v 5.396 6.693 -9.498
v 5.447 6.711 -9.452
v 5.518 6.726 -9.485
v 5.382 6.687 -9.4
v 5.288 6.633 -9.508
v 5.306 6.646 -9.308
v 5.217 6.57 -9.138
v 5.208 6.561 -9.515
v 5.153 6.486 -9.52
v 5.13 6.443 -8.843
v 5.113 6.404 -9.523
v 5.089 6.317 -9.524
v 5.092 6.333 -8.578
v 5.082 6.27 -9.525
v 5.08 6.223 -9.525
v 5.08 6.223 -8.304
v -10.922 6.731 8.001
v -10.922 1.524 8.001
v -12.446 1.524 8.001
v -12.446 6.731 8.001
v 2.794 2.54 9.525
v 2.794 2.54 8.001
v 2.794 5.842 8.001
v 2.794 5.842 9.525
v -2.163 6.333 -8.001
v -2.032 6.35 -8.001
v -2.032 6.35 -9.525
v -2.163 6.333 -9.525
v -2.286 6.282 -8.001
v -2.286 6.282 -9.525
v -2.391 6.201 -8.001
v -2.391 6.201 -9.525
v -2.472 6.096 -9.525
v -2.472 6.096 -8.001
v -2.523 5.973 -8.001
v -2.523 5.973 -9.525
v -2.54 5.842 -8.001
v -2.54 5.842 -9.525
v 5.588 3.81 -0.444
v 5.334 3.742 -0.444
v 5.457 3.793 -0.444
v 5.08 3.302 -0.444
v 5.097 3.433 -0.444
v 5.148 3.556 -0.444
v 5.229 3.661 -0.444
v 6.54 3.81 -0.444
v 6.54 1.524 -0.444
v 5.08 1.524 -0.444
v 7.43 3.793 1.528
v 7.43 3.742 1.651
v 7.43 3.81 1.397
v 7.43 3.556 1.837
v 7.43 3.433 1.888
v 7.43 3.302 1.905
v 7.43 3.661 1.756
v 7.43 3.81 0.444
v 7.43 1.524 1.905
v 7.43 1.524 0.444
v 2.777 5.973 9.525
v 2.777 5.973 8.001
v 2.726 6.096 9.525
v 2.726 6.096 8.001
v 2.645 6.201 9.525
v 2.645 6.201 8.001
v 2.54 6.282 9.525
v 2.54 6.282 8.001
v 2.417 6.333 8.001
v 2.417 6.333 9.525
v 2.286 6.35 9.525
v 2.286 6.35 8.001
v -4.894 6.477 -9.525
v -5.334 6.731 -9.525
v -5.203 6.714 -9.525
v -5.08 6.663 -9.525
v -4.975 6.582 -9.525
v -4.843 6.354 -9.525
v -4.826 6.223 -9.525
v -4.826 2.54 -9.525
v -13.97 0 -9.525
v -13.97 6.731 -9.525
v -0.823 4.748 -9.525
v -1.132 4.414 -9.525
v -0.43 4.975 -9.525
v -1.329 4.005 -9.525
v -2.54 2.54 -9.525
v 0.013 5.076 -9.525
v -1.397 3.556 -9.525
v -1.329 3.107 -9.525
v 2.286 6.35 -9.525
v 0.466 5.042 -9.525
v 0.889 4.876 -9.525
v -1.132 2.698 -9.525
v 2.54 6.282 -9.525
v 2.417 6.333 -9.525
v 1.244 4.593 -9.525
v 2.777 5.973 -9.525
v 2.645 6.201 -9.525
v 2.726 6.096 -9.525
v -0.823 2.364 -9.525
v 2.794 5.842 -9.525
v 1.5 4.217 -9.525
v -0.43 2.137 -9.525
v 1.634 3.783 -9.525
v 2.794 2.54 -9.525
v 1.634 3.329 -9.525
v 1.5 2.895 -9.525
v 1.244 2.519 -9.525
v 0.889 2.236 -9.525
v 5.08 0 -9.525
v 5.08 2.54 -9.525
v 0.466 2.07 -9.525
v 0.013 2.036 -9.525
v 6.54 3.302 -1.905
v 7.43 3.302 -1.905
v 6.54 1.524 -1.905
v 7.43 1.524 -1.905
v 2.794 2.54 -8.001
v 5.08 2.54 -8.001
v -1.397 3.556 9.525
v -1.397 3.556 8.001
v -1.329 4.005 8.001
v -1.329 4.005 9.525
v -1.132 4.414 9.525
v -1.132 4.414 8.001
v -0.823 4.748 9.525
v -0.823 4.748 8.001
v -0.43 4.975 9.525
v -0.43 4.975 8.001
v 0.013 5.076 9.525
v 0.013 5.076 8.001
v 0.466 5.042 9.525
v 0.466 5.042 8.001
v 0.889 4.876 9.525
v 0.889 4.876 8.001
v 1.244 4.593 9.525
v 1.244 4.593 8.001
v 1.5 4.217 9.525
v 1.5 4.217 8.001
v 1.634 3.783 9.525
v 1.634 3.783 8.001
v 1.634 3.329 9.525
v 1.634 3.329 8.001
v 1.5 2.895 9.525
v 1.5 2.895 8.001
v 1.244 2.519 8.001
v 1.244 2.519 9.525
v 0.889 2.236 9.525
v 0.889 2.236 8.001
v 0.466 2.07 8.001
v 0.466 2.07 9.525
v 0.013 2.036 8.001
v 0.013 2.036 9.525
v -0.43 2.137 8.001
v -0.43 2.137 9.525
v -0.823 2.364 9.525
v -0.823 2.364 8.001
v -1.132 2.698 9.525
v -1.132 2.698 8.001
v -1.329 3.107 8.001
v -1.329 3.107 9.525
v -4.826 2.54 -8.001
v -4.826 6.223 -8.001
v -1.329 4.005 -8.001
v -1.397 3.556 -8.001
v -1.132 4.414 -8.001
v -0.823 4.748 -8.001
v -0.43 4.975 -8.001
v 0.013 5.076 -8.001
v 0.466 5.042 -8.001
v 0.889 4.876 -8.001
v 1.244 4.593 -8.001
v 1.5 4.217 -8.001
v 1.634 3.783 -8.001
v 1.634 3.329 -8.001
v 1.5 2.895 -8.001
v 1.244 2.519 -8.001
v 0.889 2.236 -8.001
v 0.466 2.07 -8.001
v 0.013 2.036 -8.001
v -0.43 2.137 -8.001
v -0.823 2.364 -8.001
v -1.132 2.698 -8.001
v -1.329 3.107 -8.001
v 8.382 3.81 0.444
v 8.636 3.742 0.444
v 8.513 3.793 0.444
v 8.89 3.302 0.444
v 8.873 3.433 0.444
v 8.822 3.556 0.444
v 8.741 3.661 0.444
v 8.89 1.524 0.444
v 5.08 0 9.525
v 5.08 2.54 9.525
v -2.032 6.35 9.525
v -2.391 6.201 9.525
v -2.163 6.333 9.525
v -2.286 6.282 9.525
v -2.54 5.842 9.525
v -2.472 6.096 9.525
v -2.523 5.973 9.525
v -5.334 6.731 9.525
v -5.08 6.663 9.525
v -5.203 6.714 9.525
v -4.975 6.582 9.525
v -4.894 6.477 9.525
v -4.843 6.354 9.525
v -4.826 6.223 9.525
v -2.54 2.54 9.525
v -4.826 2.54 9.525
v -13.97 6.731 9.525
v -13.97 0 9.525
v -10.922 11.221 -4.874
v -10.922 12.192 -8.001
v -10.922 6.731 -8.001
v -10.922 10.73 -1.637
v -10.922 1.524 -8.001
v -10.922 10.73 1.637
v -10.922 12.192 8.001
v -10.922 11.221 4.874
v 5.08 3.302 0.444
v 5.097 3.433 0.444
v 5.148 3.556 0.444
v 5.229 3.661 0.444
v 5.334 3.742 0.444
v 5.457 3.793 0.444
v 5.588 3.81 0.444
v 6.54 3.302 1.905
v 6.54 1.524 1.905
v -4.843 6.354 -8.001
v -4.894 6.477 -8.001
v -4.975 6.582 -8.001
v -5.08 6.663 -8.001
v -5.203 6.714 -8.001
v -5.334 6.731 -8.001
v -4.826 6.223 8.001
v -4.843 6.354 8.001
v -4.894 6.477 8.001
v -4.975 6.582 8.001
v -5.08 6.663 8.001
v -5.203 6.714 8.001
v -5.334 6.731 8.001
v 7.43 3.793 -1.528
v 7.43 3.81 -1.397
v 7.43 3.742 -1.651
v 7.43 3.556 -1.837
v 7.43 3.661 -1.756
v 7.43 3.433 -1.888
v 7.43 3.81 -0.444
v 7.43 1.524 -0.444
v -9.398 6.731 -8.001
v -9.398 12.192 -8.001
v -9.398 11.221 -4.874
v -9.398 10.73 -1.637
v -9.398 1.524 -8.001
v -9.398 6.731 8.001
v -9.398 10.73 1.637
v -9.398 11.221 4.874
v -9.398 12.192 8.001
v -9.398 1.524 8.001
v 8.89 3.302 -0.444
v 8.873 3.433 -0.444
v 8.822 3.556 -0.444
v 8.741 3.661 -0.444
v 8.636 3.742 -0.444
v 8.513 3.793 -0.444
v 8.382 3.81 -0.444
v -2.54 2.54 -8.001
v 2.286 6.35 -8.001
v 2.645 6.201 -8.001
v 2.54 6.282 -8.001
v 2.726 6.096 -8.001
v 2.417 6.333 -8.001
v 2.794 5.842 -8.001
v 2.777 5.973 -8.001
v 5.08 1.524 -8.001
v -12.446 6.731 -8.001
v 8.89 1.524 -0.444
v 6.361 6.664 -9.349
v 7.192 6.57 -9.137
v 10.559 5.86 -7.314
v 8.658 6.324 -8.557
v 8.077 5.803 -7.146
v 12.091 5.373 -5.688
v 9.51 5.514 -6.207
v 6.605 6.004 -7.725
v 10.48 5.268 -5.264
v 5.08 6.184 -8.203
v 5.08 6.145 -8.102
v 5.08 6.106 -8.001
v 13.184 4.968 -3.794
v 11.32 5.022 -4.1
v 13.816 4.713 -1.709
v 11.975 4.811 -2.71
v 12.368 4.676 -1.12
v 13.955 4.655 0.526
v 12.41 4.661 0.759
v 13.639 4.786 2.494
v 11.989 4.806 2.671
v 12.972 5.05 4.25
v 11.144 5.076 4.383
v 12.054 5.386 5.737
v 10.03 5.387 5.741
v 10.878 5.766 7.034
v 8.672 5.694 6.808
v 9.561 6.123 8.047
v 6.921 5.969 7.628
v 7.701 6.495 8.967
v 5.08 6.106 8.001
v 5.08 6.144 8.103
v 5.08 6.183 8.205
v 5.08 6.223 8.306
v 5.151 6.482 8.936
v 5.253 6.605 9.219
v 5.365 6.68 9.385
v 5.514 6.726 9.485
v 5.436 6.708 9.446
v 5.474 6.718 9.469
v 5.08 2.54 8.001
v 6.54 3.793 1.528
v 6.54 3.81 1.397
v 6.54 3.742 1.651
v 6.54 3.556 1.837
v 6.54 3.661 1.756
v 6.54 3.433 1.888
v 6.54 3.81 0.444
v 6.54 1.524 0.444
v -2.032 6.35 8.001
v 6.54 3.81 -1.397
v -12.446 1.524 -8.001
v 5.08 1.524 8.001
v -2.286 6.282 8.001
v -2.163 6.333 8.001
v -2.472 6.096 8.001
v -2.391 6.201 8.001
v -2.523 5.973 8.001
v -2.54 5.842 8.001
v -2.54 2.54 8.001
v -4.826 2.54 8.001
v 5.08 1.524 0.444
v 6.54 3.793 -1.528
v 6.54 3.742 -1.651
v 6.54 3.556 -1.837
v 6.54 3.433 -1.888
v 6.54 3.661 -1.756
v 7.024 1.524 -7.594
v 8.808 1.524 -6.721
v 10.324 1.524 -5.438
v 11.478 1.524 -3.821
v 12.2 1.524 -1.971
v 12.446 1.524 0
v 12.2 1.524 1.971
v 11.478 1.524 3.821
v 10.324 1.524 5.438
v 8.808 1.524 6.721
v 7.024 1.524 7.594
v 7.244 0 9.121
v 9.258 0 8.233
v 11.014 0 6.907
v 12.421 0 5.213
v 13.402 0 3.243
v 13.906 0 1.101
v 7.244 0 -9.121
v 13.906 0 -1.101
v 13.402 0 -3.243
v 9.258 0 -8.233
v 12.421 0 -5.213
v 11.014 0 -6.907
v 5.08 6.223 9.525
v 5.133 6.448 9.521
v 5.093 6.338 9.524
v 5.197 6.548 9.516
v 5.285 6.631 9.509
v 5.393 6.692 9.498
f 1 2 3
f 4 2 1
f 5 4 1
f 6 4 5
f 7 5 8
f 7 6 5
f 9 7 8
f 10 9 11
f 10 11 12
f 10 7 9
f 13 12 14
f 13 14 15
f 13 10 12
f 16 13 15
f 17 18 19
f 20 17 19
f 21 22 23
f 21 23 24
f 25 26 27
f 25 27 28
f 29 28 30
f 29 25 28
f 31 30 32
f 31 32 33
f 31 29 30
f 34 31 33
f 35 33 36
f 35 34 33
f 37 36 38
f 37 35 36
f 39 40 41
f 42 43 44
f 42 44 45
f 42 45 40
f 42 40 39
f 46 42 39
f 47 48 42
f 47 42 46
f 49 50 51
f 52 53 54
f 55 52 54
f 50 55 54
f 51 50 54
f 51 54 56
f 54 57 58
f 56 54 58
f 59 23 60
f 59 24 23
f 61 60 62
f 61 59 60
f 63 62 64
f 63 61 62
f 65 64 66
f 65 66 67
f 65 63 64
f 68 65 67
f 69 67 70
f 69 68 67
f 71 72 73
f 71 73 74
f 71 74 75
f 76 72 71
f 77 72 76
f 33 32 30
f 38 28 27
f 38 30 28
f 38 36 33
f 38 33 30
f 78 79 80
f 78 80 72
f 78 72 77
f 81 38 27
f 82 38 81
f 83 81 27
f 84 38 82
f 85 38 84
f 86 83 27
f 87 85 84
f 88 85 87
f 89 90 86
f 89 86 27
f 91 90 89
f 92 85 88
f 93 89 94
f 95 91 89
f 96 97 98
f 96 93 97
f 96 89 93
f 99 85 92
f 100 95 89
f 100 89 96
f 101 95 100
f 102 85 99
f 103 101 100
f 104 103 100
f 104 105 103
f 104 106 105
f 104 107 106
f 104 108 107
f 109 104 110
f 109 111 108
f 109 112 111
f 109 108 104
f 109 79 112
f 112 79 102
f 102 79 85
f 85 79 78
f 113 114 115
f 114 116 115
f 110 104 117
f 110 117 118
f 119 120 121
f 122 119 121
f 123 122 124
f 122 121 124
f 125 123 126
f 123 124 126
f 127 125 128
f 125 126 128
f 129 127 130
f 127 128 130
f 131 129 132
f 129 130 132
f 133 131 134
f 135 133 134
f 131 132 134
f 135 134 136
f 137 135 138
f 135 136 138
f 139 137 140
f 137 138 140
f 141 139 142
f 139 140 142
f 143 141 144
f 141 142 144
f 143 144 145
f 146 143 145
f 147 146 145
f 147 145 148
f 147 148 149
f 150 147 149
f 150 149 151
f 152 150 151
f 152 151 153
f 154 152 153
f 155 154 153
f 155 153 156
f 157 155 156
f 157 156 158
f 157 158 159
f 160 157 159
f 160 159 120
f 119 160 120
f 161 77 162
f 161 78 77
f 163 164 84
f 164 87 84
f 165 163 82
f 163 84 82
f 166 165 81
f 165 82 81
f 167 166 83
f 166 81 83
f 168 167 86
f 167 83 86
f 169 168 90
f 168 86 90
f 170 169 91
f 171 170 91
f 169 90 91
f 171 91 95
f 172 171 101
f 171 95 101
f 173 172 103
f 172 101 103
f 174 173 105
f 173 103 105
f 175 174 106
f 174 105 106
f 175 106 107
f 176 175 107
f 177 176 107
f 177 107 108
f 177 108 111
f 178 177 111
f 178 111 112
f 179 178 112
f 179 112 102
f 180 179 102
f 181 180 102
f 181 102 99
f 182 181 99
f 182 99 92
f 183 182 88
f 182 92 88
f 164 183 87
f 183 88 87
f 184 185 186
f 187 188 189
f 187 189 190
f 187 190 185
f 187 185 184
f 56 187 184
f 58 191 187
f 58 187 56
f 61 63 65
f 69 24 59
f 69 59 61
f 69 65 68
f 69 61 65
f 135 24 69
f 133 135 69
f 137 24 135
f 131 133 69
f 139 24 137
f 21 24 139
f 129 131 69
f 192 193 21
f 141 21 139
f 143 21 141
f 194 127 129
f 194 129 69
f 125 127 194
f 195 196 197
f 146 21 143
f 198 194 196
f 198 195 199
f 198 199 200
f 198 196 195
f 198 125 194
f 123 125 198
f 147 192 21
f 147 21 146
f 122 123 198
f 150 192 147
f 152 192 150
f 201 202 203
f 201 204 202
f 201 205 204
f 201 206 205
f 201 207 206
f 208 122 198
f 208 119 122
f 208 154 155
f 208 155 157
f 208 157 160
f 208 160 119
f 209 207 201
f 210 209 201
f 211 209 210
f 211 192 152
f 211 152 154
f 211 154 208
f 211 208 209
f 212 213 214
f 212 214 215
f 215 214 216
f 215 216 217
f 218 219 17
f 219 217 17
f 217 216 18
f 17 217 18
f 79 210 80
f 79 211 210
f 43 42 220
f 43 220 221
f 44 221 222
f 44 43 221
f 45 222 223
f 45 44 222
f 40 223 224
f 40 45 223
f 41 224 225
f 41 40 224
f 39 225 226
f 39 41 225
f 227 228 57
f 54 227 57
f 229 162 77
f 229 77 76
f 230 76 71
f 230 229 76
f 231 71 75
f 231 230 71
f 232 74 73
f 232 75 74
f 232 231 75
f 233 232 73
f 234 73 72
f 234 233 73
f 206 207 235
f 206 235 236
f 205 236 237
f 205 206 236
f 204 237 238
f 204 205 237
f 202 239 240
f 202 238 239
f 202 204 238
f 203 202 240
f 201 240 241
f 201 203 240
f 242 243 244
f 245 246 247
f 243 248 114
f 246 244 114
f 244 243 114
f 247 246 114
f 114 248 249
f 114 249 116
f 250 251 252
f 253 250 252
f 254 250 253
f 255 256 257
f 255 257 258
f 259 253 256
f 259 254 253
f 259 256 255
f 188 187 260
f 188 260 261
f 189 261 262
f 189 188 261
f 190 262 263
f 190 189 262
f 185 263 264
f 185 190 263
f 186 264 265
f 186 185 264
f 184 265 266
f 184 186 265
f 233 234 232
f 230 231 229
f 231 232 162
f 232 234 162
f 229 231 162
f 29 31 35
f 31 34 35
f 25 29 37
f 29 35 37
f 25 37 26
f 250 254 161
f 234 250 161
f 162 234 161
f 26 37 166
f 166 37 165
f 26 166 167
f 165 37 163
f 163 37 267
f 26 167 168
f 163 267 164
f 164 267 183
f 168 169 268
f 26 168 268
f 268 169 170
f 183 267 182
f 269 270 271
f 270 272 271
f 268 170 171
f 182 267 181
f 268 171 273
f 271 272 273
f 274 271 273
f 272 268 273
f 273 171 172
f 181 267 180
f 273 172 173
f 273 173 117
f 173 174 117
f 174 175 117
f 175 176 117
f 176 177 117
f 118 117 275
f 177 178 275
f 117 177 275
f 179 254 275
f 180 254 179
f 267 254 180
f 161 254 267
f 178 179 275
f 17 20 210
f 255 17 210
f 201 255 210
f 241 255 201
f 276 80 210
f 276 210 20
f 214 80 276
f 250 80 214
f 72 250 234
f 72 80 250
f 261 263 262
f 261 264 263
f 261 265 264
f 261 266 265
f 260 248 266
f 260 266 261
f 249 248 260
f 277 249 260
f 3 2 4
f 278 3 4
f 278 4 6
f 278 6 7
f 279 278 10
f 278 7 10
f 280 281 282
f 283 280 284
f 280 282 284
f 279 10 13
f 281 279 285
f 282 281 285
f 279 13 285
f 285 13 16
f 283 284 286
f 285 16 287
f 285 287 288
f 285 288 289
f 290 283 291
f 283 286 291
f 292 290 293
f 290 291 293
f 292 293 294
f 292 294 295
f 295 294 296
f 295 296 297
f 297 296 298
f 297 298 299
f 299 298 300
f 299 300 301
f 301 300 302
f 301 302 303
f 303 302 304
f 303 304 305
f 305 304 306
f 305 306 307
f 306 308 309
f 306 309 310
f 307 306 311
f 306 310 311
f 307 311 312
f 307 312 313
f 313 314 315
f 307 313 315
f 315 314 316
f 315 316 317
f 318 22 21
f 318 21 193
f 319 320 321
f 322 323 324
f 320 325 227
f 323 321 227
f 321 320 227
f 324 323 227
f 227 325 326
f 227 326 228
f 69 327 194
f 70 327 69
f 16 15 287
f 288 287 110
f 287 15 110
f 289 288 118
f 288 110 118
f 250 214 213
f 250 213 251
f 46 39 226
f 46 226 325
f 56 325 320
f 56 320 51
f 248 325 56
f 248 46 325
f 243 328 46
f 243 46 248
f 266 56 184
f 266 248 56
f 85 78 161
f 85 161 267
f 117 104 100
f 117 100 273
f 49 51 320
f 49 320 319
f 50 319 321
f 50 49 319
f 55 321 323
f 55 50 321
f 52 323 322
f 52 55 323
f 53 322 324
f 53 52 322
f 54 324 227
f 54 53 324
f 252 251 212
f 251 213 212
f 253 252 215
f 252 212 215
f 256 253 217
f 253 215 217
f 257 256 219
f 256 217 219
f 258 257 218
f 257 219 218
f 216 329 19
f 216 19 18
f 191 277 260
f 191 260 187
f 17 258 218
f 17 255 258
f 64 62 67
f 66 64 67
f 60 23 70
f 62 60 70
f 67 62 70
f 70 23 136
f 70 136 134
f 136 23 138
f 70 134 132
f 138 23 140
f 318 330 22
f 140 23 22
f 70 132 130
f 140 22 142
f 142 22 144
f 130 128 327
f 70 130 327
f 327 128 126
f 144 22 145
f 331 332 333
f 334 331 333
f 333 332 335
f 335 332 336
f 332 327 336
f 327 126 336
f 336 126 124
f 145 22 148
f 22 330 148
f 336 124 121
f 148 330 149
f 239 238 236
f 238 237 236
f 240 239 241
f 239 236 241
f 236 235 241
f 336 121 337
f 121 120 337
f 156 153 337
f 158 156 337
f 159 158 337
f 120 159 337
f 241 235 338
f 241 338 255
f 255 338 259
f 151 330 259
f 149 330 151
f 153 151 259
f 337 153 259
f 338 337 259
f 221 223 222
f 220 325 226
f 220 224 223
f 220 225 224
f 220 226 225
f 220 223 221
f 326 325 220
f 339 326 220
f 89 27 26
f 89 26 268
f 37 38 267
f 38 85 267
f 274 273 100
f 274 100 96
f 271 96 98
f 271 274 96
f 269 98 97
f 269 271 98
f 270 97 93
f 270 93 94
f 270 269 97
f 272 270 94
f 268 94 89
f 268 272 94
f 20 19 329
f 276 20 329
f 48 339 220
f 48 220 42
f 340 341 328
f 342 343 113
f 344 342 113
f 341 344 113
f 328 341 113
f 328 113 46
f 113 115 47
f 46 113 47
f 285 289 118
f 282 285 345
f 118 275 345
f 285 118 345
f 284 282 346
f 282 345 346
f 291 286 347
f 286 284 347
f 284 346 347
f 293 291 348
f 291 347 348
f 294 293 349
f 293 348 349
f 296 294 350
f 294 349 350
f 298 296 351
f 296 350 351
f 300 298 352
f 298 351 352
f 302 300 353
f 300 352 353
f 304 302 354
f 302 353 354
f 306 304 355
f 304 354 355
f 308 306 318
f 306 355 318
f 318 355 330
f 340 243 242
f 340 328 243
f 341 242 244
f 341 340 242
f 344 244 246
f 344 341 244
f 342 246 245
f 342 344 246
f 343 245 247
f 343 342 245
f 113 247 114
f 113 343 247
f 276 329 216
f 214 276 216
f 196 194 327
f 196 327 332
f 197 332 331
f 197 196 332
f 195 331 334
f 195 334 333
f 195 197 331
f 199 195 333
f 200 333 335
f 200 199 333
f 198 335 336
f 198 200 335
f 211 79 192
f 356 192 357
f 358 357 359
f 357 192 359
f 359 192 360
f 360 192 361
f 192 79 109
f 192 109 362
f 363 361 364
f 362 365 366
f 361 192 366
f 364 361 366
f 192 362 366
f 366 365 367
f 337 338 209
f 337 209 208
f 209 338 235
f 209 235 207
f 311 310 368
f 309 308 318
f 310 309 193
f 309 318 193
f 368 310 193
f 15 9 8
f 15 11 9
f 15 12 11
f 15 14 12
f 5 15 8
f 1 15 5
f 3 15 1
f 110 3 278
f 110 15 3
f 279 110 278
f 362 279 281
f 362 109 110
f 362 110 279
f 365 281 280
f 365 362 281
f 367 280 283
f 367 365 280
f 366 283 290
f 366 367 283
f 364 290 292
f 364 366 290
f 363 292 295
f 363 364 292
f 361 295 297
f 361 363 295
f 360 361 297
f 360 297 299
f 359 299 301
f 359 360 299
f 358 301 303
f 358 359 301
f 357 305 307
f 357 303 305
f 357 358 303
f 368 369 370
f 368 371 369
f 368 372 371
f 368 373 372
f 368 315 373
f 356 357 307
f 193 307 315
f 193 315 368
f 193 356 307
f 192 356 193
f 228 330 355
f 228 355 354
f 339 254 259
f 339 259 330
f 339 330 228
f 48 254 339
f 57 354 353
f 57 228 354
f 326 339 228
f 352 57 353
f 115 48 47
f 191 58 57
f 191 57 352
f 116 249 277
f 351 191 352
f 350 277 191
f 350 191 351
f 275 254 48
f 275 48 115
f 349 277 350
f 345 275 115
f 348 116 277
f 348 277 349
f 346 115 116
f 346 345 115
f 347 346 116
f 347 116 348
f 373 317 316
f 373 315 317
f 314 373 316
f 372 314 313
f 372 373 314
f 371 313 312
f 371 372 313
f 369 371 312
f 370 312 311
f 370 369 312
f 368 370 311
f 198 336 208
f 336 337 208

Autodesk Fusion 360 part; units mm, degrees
sketch "Sketch1" plane through (0, 0, 0) normal (0, 1, 0) x (1, 0, 0)
  line L0 (-13.97, -9.525) -> (-13.97, 9.525)
  line L1 (-13.97, 9.525) -> (13.97, 9.525)
  line L2 (13.97, 9.525) -> (13.97, -9.525)
  line L3 (13.97, -9.525) -> (-13.97, 9.525) construction
  line L4 (-13.97, -9.525) -> (13.97, 9.525) construction
  line L5 (5.08, 9.525) -> (5.08, -9.525) construction
  line L6 (5.08, 0) -> (13.97, 0) construction
  arc A0 (5.08, -9.525) -> (5.08, 9.525) centre (4.4223, 0) ccw
  line L7 (-13.97, 9.525) -> (13.97, 9.525)
  arc A1 (5.08, -9.525) -> (5.08, 9.525) centre (4.4223, 0) ccw
  line L8 (13.97, -9.525) -> (-13.97, -9.525)
  line L9 (-13.97, -9.525) -> (-13.97, 9.525)
  line L10 (-12.446, 8.001) -> (5.08, 8.001)
  line L11 (5.08, -8.001) -> (-12.446, -8.001)
  line L12 (-12.446, -8.001) -> (-12.446, 8.001)
  line L13 (13.97, 0) -> (12.446, 0) construction
  arc A2 (5.08, -8.001) -> (5.08, 8.001) centre (4.4176, 0) ccw
  line L14 (-10.922, 8.001) -> (-10.922, -8.001)
  line L15 (-9.398, 8.001) -> (-9.398, -8.001)
  line L16 (2.794, 9.525) -> (2.794, 8.001)
  line L17 (2.794, -8.001) -> (2.794, -9.525)
  line L18 (-2.54, 9.525) -> (-2.54, 8.001)
  line L19 (-2.54, -8.001) -> (-2.54, -9.525)
  line L20 (-4.826, 9.525) -> (-4.826, 8.001)
  line L21 (-4.826, -8.001) -> (-4.826, -9.525)
  line L22 (5.08, 9.525) -> (5.08, 8.001)
  line L23 (5.08, -8.001) -> (5.08, -9.525)
  line L24 (5.08, 0.4445) -> (8.89, 0.4445)
  line L25 (8.89, 0.4445) -> (8.89, -0.4445)
  line L26 (8.89, -0.4445) -> (5.08, -0.4445)
  line L27 (5.08, -0.4445) -> (5.08, 0.4445)
  line L28 (5.08, 0) -> (6.985, 0) construction
  line L29 (7.4295, 1.905) -> (6.5405, 1.905)
  line L30 (6.5405, 1.905) -> (6.5405, -1.905)
  line L31 (6.5405, -1.905) -> (7.4295, -1.905)
  line L32 (7.4295, -1.905) -> (7.4295, 1.905)
  line L33 (7.4295, 1.905) -> (6.5405, -1.905) construction
  line L34 (6.5405, 1.905) -> (7.4295, -1.905) construction
  point P0 (6.985, 0)
  dimension "d2" = 19.05
  dimension "d4" = 9.525
  dimension "d5" = 9.525
  dimension "d6" = 27.94
  dimension "d7" = 19.05
  dimension "d12" = 1.524
  dimension "d13" = 1.524
  dimension "d14" = 1.524
  dimension "d17" = 19.05
  dimension "d18" = 19.05
  dimension "d19" = 1.524
  dimension "d20" = 1.524
  dimension "d21" = 1.524
  dimension "d22" = 16.764
  dimension "d23" = 11.43
  dimension "d24" = 16.764
  dimension "d25" = 11.43
  dimension "d26" = 2.286
  dimension "d27" = 2.286
  dimension "d38" = 3.81
  dimension "d39" = 0.889
  dimension "d40" = 0.4445
  dimension "d41" = 1.905
  dimension "d42" = 0.889
  dimension "d43" = 3.81
extrude "Extrude1" add sketch "Sketch1" along normal blind 6.731 contours L0 L1 L7 L8 L9 L10 L11 L12 L20 L21 | A0 A1 A2 L22 L23 makes body 1 at (9.3779, 4.4873, -8.1609) makes body 2 at (-13.97, 4.4873, 3.175)
extrude "Extrude2" add sketch "Sketch1" along normal blind 12.192 contours L10 L11 L14 L15 bodies 2
extrude "Extrude3" add sketch "Sketch1" along normal blind 1.524 contours L10 L11 A2 L15 | L10 L11 L12 L14 | L24 L26 L27 L30 | L24 L29 L30 L32 | L24 L26 L30 L32 | L24 L25 L26 L32 | L26 L30 L31 L32 bodies 1 2
extrude "Extrude4" add sketch "Sketch1" along normal blind 2.54 contours L8 L11 L19 L21 | L1 L7 L10 L18 L20 | L8 L11 L17 L23 | L1 L7 L10 L16 L22 bodies 1
extrude "Extrude5" add sketch "Sketch1" along normal blind 6.35 contours L8 L11 L17 L19 | L1 L7 L10 L16 L18 bodies 1
extrude "Extrude6" add sketch "Sketch1" along normal blind 3.81 contours L24 L26 L27 L30 | L24 L29 L30 L32 | L24 L26 L30 L32 | L24 L25 L26 L32 | L26 L30 L31 L32 bodies 1
sketch "Sketch2" plane through (-10.922, 0, 0) normal (-1, 0, 0) x (0, 0, 1)
  line L0 (-8.001, 1.524) -> (8.001, 1.524)
  line L1 (8.001, 1.524) -> (8.001, 6.731)
  line L2 (8.001, 6.731) -> (8.001, 12.192)
  line L3 (8.001, 12.192) -> (-8.001, 12.192)
  line L4 (-8.001, 12.192) -> (-8.001, 6.731)
  line L5 (-8.001, 6.731) -> (-8.001, 1.524)
  line L6 (0, 12.192) -> (0, 10.668)
  arc A0 (-8.001, 12.192) -> (8.001, 12.192) centre (0, 32.4326) ccw
  dimension "d46" = 1.524
extrude "Extrude7" cut sketch "Sketch2" against normal up to surface (1.524 mm away) contours L3 L6 A0 | L3 L6 A0 bodies 1
sketch "Sketch3" plane through (0, 0, -9.525) normal (0, 0, -1) x (-1, 0, 0)
  line L0 (-5.08, 0) -> (13.97, 0)
  line L1 (13.97, 0) -> (13.97, 6.731)
  line L2 (13.97, 6.731) -> (4.826, 6.731)
  line L3 (4.826, 6.731) -> (4.826, 2.54)
  line L4 (4.826, 2.54) -> (2.54, 2.54)
  line L5 (2.54, 2.54) -> (2.54, 6.35)
  line L6 (2.54, 6.35) -> (-2.794, 6.35)
  line L7 (-2.794, 6.35) -> (-2.794, 2.54)
  line L8 (-2.794, 2.54) -> (-5.08, 2.54)
  line L9 (-5.08, 2.54) -> (-5.08, 0)
  line L10 (-2.794, 3.556) -> (2.54, 3.556) construction
  line L11 (-0.127, 6.35) -> (-0.127, 3.556) construction
  circle A0 centre (-0.127, 3.556) radius 1.524
  dimension "d49" = 2.667
  dimension "d50" = 2.794
  dimension "d51" = 3.048
extrude "Extrude8" cut sketch "Sketch3" against normal up to surface (19.05 mm away) contours A0 bodies 1
fillet "Fillet1" radius 0.508 12 edges at (-4.826, 6.731, -8.763) (-2.54, 6.35, -8.763) (2.794, 6.35, -8.763) (5.08, 6.731, -8.763) (5.08, 6.731, 8.763) (2.794, 6.35, 8.763) (-2.54, 6.35, 8.763) (-4.826, 6.731, 8.763) (5.08, 3.81, 0) (6.985, 3.81, -1.905) (6.985, 3.81, 1.905) (8.89, 3.81, 0) on bodies 1
ref_plane "WorkPlane2" through (5.08, 3.3655, 0) normal (-1, 0, 0) x (0, 0, 1)
sketch "Sketch6" plane through (5.08, 3.3655, 0) normal (-1, 0, 0) x (0, 0, -1)
  line L0 (9.524, -3.3789) -> (-9.526, -3.3789)
  arc A0 (9.524, -3.3789) -> (-9.526, -3.3789) centre (-0.001, -23.9778) ccw
  dimension "d58" = 19.05
extrude "Extrude9" cut sketch "Sketch6" against normal blind 8.89 bodies 1
